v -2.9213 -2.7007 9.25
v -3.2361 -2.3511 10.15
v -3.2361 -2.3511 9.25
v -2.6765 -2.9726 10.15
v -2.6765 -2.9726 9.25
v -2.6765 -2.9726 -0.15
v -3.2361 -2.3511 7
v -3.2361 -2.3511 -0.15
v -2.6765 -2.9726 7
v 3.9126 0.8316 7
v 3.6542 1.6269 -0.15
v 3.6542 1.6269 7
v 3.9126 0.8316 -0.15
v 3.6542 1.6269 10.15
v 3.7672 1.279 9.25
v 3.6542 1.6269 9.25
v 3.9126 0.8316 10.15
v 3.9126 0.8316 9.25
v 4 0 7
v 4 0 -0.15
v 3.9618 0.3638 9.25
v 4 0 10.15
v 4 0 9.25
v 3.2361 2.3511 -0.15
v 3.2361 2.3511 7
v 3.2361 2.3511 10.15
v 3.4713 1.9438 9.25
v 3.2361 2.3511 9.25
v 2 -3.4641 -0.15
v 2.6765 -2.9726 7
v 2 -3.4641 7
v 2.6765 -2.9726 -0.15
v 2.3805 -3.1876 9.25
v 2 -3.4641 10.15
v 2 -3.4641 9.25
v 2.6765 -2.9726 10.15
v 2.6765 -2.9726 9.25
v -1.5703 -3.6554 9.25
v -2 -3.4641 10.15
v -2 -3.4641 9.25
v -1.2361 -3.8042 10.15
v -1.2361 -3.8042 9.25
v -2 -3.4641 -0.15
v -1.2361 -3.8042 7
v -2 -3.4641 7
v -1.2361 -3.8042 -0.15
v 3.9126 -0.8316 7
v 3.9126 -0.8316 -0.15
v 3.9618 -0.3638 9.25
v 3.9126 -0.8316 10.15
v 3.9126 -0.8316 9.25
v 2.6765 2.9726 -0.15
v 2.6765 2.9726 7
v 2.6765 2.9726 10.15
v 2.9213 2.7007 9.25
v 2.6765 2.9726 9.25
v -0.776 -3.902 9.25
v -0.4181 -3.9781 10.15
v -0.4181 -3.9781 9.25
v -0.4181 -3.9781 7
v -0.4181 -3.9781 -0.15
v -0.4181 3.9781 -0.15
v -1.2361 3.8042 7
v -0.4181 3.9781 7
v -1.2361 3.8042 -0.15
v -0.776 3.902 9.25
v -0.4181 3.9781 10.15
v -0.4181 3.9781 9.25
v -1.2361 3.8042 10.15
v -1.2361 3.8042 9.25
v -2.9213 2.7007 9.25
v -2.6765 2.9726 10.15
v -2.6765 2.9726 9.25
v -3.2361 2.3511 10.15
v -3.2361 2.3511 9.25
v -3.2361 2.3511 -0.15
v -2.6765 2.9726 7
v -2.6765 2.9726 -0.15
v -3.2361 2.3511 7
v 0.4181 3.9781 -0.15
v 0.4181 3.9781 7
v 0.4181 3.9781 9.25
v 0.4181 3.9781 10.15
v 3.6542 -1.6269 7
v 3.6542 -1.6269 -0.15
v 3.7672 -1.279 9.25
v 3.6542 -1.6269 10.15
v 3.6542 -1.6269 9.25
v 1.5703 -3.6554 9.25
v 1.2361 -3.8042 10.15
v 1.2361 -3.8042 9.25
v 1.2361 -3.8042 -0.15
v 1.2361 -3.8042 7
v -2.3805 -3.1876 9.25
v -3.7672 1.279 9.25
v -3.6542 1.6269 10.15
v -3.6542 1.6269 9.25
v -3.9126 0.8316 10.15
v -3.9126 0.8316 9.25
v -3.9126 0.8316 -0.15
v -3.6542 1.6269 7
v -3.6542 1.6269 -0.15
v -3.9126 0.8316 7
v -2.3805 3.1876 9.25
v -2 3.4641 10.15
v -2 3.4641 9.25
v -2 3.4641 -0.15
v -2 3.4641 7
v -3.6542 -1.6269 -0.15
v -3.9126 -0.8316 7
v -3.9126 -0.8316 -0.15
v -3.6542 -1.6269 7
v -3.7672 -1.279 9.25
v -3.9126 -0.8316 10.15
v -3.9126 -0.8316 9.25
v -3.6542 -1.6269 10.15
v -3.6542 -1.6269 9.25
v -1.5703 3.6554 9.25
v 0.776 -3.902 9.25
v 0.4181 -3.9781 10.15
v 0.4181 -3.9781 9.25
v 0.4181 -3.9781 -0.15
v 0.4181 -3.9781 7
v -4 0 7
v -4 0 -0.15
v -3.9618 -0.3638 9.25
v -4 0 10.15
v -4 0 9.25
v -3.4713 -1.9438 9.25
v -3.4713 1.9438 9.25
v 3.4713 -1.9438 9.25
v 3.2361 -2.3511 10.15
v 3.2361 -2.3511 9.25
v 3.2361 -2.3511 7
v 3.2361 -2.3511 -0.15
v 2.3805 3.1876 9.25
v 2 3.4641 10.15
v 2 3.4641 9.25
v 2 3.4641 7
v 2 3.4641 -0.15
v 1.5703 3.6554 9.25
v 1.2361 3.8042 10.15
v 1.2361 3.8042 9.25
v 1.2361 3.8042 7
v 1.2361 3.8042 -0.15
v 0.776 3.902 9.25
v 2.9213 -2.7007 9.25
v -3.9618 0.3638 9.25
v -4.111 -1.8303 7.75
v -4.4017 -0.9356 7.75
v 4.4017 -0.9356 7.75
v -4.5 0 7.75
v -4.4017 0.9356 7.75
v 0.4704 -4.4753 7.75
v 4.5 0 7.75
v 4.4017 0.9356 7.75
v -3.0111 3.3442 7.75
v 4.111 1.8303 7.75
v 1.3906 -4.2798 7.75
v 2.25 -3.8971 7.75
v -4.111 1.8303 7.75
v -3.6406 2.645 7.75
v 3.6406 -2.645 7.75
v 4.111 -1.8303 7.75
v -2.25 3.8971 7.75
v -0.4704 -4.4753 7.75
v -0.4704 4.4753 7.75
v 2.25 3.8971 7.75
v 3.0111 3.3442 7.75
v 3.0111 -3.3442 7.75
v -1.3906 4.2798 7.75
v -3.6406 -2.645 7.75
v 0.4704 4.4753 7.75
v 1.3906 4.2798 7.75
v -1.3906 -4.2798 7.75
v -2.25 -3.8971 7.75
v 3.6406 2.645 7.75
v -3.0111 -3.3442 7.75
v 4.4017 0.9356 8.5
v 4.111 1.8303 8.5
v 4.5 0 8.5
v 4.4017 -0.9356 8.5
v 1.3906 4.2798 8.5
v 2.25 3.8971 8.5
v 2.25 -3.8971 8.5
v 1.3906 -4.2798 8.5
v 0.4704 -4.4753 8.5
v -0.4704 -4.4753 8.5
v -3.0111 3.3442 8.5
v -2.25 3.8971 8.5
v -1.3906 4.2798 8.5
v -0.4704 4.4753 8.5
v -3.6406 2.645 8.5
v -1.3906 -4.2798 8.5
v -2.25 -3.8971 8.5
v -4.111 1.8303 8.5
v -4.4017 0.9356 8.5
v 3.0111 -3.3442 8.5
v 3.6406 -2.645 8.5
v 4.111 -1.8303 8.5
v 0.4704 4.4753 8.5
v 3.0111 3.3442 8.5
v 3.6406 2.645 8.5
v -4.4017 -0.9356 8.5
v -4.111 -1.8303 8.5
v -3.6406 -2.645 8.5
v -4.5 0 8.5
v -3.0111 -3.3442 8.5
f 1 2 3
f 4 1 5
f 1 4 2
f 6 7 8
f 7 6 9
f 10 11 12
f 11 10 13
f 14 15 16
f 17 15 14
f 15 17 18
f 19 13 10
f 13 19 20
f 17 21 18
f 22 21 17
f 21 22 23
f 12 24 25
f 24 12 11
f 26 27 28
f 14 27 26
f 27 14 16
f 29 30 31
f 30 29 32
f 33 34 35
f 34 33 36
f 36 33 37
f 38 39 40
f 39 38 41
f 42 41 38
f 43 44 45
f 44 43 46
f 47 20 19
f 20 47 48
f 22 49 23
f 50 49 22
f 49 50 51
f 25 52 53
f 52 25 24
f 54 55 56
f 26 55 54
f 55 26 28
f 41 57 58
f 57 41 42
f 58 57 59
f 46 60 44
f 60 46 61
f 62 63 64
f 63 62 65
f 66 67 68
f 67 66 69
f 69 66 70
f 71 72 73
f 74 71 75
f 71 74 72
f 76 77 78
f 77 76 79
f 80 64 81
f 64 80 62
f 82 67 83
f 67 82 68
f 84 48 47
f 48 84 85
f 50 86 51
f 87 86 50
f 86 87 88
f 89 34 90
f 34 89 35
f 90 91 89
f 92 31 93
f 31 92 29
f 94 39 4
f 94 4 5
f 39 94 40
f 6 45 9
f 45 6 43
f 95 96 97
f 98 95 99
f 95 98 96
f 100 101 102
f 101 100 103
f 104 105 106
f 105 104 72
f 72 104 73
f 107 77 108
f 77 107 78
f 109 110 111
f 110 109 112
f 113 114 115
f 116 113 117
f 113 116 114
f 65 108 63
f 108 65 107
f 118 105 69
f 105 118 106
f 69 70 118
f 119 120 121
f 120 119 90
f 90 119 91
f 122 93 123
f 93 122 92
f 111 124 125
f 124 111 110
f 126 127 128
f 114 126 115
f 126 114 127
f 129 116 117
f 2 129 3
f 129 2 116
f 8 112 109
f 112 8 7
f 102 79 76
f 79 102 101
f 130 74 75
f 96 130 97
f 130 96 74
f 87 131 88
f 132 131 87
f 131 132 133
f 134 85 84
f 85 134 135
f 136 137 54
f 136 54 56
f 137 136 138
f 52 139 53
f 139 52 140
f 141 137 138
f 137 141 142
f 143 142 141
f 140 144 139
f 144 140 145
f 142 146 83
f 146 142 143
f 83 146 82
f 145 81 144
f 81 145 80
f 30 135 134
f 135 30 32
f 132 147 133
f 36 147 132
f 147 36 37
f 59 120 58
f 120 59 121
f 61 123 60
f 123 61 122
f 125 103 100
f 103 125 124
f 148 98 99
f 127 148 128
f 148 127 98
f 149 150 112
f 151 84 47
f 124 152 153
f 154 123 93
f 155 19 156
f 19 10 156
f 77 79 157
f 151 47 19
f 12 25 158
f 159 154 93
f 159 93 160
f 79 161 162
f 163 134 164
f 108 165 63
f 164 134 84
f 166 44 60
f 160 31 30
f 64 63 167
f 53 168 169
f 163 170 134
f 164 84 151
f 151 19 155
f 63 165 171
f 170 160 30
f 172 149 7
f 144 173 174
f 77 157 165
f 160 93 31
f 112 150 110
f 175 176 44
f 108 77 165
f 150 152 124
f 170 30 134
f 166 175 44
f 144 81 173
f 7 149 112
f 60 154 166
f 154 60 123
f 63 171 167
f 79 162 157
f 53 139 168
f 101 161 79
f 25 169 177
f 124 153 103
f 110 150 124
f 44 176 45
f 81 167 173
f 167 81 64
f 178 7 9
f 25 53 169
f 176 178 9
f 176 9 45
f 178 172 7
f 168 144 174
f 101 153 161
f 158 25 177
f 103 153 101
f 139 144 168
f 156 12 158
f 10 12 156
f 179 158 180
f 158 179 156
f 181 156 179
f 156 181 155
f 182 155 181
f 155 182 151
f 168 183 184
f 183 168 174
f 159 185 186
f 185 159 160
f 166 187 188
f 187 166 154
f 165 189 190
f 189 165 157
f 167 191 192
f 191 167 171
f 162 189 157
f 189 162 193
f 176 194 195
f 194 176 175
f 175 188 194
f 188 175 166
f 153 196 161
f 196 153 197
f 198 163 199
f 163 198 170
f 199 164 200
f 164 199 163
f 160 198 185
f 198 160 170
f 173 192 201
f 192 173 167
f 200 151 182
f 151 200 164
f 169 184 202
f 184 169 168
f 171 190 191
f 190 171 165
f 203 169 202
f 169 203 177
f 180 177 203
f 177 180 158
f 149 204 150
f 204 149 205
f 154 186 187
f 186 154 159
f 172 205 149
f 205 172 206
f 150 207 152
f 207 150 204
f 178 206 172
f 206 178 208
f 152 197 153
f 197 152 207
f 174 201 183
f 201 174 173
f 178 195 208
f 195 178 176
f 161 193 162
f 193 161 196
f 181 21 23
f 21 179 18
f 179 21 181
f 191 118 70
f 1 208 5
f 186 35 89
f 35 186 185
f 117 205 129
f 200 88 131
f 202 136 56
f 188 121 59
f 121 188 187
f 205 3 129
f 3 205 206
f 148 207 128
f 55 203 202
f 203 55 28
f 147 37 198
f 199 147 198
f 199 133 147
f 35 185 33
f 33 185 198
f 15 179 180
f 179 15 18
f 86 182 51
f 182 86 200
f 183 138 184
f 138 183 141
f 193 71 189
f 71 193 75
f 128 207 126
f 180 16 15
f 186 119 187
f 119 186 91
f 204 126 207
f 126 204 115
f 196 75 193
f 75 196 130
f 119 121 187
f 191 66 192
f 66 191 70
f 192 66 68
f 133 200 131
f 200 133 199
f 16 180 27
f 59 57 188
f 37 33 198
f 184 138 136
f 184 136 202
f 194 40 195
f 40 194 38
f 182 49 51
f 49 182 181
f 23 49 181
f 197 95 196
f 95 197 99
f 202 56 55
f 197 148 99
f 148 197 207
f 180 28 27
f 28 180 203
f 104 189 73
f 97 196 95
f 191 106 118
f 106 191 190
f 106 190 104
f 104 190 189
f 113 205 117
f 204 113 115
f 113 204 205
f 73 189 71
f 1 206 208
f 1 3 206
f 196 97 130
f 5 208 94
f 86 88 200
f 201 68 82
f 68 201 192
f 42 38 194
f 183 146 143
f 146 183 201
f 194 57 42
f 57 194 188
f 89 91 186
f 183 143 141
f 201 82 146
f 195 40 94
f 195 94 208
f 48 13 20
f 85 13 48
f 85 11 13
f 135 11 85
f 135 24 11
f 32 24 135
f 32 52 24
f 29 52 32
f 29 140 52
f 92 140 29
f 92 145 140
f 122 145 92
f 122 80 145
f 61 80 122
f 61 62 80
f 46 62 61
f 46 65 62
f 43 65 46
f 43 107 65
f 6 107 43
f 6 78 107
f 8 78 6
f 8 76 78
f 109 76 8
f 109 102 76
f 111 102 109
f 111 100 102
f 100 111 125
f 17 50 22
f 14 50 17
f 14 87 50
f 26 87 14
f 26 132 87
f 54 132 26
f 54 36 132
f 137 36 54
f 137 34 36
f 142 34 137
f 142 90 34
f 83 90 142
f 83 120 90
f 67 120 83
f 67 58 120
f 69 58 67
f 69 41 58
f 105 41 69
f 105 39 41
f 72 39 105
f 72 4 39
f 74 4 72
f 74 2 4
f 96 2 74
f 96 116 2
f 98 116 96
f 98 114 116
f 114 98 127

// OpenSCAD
// file: pin_joints.scad
include <pins.scad>

// default is 0.3
tolerance = 0.3;

// pinpeg(h=40);
// pin();
// pin(side=true);
// pinhole(t=tolerance);
// pintack(h=10, r=4);
//pins();

// wheel();
// translate([-25/2, 0, 0]) axel_tight();
// translate([-25/2, 0, 0]) axel_loose();
// translate([-25/2, 0, 0]) axel_loose_and_tight();
//plate();
//plate_simple();

module pins() {
  translate([-21, 0, 0]) pinpeg(h=20);
  translate([0, 0, 0]) pintack(h=11);
  translate([21, 0, 0]) pintack(h=11);
}

module wheel() {
  difference() {
    union() {
      translate([0, 0, 10]) cylinder(h=5, r1=20/2, r2=17/2);
      translate([0, 0, 5]) cylinder(h=5, r=20/2);
      translate([0, 0, 0]) cylinder(h=5, r1=17/2, r2=20/2);
    }

    translate([0, 0, 11]) cylinder(h=15, r=13/2);    
    pinhole(h=5, t=tolerance);
  }  
}

module axel_tight() {
  difference() {
    union() {
      translate([0, -2.5, 0]) cube([25, 5, 5]);
      cylinder(h=5, r=5*1.75);
      translate([25, 0, 0]) cylinder(h=12, r=5*1.75);
    }
  
    pinhole(h=5, t=tolerance);
    translate([25, 0, 10+2]) rotate([180, 0, 0]) pinhole(h=8, t=tolerance);
  }
}

module axel_loose() {
  difference() {
    union() {
      translate([0, -2.5, 0]) cube([25, 5, 5]);
      cylinder(h=5, r=5*1.75);
      translate([25, 0, 0]) cylinder(h=5, r=5*1.75);
    }
  
    translate([0, 0, 5]) rotate([180, 0, 0]) pinhole(h=5, t=tolerance, tight=false);
    translate([25, 0, 0]) pinhole(h=5, t=tolerance, tight=false);
  }
}

module axel_loose_and_tight() {
  difference() {
    union() {
      translate([0, -2.5, 0]) cube([25, 5, 5]);
      cylinder(h=5, r=5*1.75);
      translate([25, 0, 0]) cylinder(h=5, r=5*1.75);
    }
  
    pinhole(h=10, t=tolerance);
    translate([25, 0, 0]) pinhole(h=10, t=tolerance, tight=false);
  }
}

module plate() {
  %translate([0, 0, -0.5]) cube([100, 100, 1], center=true);
  
  translate([0, 21, 0]) pins();

  translate([-21, 0, 0]) wheel();

  translate([-21, -21, 0]) wheel();

  translate([0, 0, 0]) axel_tight();

  translate([0, -20, 0]) axel_loose();
}

module plate_simple() {
  %translate([0, 0, -0.5]) cube([100, 100, 1], center=true);
  
 translate([-10.5, 10.5, 0]) pintack(h=11);
 translate([10.5, 10.5, 0]) pintack(h=11);
 translate([-25/2, -10.5, 0]) axel_loose_and_tight();
  
}
// file: pins.scad
// Pin Connectors V3
// Tony Buser <tbuser@gmail.com>
// Modified by Emmett Lalish

//pinhole(tight=true,fixed=false);
//pin_vertical();

// test();
// pintack(h=10);
// pinpeg(h=20);


module test() {
  tolerance = 0.3;
  
  translate([-12, 12, 0]) pinpeg(h=20);
  translate([12, 12, 0]) pintack(h=10);
  
  difference() {
    union() {
      translate([0, -12, 2.5]) cube(size = [59, 20, 5], center = true);
      translate([24, -12, 7.5]) cube(size = [12, 20, 15], center = true);
    }
    translate([-24, -12, 0]) pinhole(h=5, t=tolerance);
    translate([-12, -12, 0]) pinhole(h=5, t=tolerance, tight=false);
    translate([0, -12, 0]) pinhole(h=10, t=tolerance);
    translate([12, -12, 0]) pinhole(h=10, t=tolerance, tight=false);
    translate([24, -12, 15]) rotate([0, 180, 0]) pinhole(h=10, t=tolerance);
  }
}

module pinhole(h=10, r=4, lh=3, lt=1, t=0.3, tight=true, fixed=false) {
  // h = shaft height
  // r = shaft radius
  // lh = lip height
  // lt = lip thickness
  // t = extra tolerance for loose fit
  // tight = set to false if you want a joint that spins easily
  // fixed = set to true so pins can't spin
  
intersection(){
  union() {
	if (tight == true || fixed == true) {
      pin_solid(h, r, lh, lt);
	  translate([0,0,-t/2])cylinder(h=h+t, r=r, $fn=30);
	} else {
	  pin_solid(h, r+t/2, lh, lt);
	  translate([0,0,-t/2])cylinder(h=h+t, r=r+t/2, $fn=30);
	}
    
    
    // widen the entrance hole to make insertion easier
    //translate([0, 0, -0.1]) cylinder(h=lh/3, r2=r, r1=r+(t/2)+(lt/2),$fn=30);
  }
  if (fixed == true) {
	translate([-r*2, -r*0.75, -1])cube([r*4, r*1.5, h+2]);
  }
}}

module pin(h=10, r=4, lh=3, lt=1, t=0.2, side=false) {
  // h = shaft height
  // r = shaft radius
  // lh = lip height
  // lt = lip thickness
  // side = set to true if you want it printed horizontally

  if (side) {
    pin_horizontal(h, r, lh, lt, t);
  } else {
    pin_vertical(h, r, lh, lt, t);
  }
}

module pintack(h=10, r=4, lh=3, lt=1, t=0.2, bh=3, br=8.75) {
  // bh = base_height
  // br = base_radius
  
  union() {
    cylinder(h=bh, r=br);
    translate([0, 0, bh]) pin(h, r, lh, lt, t);
  }
}

module pinpeg(h=20, r=4, lh=3, lt=1, t=0.2) {
  union() {
    translate([0,-0.05, 0]) pin(h/2+0.1, r, lh, lt, t, side=true);
    translate([0,0.05, 0]) rotate([0, 0, 180]) pin(h/2+0.1, r, lh, lt, t, side=true);
  }
}

// just call pin instead, I made this module because it was easier to do the rotation option this way
// since openscad complains of recursion if I did it all in one module
module pin_vertical(h=10, r=4, lh=3, lt=1, t=0.2) {
  // h = shaft height
  // r = shaft radius
  // lh = lip height
  // lt = lip thickness

  difference() {
    pin_solid(h, r-t/2, lh, lt);
    
    // center cut
    translate([-lt*3/2, -(r*2+lt*2)/2, h/5+lt*3/2]) cube([lt*3, r*2+lt*2, h]);
    //translate([0, 0, h/4]) cylinder(h=h+lh, r=r/2.5, $fn=20);
    // center curve
    translate([0, 0, h/5+lt*3/2]) rotate([90, 0, 0]) cylinder(h=r*2, r=lt*3/2, center=true, $fn=20);
  
    // side cuts
    translate([-r*2, -r-r*0.75+t/2, -1]) cube([r*4, r, h+2]);
    translate([-r*2, r*0.75-t/2, -1]) cube([r*4, r, h+2]);
  }
}

// call pin with side=true instead of this
module pin_horizontal(h=10, r=4, lh=3, lt=1, t=0.2) {
  // h = shaft height
  // r = shaft radius
  // lh = lip height
  // lt = lip thickness
  translate([0, 0, r*0.75-t/2]) rotate([-90, 0, 0]) pin_vertical(h, r, lh, lt, t);
}

// this is mainly to make the pinhole module easier
module pin_solid(h=10, r=4, lh=3, lt=1) {
  union() {
    // shaft
    cylinder(h=h-lh, r=r, $fn=30);
    // lip
    // translate([0, 0, h-lh]) cylinder(h=lh*0.25, r1=r, r2=r+(lt/2), $fn=30);
    // translate([0, 0, h-lh+lh*0.25]) cylinder(h=lh*0.25, r2=r, r1=r+(lt/2), $fn=30);
    // translate([0, 0, h-lh+lh*0.50]) cylinder(h=lh*0.50, r1=r, r2=r-(lt/2), $fn=30);

    // translate([0, 0, h-lh]) cylinder(h=lh*0.50, r1=r, r2=r+(lt/2), $fn=30);
    // translate([0, 0, h-lh+lh*0.50]) cylinder(h=lh*0.50, r1=r+(lt/2), r2=r-(lt/3), $fn=30);    

    translate([0, 0, h-lh]) cylinder(h=lh*0.25, r1=r, r2=r+(lt/2), $fn=30);
    translate([0, 0, h-lh+lh*0.25]) cylinder(h=lh*0.25, r=r+(lt/2), $fn=30);    
    translate([0, 0, h-lh+lh*0.50]) cylinder(h=lh*0.50, r1=r+(lt/2), r2=r-(lt/2), $fn=30);    

    // translate([0, 0, h-lh]) cylinder(h=lh, r1=r+(lt/2), r2=1, $fn=30);
    // translate([0, 0, h-lh-lt/2]) cylinder(h=lt/2, r1=r, r2=r+(lt/2), $fn=30);
  }
}

module pinshaft(h=10, r=4, t=0.2, side=false){
flip=side ? 1 : 0;
translate(flip*[0,h/2,r*0.75-t/2])rotate(flip*[90,0,0])
intersection(){
	cylinder(h=h, r=r-t/2, $fn=30);
	translate([-r*2, -r*0.75+t/2, -1])cube([r*4, r*1.5-t, h+2]);
}
}
// main file
include <pins.scad>
include <pin_joints.scad>

tolerance = 0.3;

pin();
pinhole(h=10, t=tolerance);
 
